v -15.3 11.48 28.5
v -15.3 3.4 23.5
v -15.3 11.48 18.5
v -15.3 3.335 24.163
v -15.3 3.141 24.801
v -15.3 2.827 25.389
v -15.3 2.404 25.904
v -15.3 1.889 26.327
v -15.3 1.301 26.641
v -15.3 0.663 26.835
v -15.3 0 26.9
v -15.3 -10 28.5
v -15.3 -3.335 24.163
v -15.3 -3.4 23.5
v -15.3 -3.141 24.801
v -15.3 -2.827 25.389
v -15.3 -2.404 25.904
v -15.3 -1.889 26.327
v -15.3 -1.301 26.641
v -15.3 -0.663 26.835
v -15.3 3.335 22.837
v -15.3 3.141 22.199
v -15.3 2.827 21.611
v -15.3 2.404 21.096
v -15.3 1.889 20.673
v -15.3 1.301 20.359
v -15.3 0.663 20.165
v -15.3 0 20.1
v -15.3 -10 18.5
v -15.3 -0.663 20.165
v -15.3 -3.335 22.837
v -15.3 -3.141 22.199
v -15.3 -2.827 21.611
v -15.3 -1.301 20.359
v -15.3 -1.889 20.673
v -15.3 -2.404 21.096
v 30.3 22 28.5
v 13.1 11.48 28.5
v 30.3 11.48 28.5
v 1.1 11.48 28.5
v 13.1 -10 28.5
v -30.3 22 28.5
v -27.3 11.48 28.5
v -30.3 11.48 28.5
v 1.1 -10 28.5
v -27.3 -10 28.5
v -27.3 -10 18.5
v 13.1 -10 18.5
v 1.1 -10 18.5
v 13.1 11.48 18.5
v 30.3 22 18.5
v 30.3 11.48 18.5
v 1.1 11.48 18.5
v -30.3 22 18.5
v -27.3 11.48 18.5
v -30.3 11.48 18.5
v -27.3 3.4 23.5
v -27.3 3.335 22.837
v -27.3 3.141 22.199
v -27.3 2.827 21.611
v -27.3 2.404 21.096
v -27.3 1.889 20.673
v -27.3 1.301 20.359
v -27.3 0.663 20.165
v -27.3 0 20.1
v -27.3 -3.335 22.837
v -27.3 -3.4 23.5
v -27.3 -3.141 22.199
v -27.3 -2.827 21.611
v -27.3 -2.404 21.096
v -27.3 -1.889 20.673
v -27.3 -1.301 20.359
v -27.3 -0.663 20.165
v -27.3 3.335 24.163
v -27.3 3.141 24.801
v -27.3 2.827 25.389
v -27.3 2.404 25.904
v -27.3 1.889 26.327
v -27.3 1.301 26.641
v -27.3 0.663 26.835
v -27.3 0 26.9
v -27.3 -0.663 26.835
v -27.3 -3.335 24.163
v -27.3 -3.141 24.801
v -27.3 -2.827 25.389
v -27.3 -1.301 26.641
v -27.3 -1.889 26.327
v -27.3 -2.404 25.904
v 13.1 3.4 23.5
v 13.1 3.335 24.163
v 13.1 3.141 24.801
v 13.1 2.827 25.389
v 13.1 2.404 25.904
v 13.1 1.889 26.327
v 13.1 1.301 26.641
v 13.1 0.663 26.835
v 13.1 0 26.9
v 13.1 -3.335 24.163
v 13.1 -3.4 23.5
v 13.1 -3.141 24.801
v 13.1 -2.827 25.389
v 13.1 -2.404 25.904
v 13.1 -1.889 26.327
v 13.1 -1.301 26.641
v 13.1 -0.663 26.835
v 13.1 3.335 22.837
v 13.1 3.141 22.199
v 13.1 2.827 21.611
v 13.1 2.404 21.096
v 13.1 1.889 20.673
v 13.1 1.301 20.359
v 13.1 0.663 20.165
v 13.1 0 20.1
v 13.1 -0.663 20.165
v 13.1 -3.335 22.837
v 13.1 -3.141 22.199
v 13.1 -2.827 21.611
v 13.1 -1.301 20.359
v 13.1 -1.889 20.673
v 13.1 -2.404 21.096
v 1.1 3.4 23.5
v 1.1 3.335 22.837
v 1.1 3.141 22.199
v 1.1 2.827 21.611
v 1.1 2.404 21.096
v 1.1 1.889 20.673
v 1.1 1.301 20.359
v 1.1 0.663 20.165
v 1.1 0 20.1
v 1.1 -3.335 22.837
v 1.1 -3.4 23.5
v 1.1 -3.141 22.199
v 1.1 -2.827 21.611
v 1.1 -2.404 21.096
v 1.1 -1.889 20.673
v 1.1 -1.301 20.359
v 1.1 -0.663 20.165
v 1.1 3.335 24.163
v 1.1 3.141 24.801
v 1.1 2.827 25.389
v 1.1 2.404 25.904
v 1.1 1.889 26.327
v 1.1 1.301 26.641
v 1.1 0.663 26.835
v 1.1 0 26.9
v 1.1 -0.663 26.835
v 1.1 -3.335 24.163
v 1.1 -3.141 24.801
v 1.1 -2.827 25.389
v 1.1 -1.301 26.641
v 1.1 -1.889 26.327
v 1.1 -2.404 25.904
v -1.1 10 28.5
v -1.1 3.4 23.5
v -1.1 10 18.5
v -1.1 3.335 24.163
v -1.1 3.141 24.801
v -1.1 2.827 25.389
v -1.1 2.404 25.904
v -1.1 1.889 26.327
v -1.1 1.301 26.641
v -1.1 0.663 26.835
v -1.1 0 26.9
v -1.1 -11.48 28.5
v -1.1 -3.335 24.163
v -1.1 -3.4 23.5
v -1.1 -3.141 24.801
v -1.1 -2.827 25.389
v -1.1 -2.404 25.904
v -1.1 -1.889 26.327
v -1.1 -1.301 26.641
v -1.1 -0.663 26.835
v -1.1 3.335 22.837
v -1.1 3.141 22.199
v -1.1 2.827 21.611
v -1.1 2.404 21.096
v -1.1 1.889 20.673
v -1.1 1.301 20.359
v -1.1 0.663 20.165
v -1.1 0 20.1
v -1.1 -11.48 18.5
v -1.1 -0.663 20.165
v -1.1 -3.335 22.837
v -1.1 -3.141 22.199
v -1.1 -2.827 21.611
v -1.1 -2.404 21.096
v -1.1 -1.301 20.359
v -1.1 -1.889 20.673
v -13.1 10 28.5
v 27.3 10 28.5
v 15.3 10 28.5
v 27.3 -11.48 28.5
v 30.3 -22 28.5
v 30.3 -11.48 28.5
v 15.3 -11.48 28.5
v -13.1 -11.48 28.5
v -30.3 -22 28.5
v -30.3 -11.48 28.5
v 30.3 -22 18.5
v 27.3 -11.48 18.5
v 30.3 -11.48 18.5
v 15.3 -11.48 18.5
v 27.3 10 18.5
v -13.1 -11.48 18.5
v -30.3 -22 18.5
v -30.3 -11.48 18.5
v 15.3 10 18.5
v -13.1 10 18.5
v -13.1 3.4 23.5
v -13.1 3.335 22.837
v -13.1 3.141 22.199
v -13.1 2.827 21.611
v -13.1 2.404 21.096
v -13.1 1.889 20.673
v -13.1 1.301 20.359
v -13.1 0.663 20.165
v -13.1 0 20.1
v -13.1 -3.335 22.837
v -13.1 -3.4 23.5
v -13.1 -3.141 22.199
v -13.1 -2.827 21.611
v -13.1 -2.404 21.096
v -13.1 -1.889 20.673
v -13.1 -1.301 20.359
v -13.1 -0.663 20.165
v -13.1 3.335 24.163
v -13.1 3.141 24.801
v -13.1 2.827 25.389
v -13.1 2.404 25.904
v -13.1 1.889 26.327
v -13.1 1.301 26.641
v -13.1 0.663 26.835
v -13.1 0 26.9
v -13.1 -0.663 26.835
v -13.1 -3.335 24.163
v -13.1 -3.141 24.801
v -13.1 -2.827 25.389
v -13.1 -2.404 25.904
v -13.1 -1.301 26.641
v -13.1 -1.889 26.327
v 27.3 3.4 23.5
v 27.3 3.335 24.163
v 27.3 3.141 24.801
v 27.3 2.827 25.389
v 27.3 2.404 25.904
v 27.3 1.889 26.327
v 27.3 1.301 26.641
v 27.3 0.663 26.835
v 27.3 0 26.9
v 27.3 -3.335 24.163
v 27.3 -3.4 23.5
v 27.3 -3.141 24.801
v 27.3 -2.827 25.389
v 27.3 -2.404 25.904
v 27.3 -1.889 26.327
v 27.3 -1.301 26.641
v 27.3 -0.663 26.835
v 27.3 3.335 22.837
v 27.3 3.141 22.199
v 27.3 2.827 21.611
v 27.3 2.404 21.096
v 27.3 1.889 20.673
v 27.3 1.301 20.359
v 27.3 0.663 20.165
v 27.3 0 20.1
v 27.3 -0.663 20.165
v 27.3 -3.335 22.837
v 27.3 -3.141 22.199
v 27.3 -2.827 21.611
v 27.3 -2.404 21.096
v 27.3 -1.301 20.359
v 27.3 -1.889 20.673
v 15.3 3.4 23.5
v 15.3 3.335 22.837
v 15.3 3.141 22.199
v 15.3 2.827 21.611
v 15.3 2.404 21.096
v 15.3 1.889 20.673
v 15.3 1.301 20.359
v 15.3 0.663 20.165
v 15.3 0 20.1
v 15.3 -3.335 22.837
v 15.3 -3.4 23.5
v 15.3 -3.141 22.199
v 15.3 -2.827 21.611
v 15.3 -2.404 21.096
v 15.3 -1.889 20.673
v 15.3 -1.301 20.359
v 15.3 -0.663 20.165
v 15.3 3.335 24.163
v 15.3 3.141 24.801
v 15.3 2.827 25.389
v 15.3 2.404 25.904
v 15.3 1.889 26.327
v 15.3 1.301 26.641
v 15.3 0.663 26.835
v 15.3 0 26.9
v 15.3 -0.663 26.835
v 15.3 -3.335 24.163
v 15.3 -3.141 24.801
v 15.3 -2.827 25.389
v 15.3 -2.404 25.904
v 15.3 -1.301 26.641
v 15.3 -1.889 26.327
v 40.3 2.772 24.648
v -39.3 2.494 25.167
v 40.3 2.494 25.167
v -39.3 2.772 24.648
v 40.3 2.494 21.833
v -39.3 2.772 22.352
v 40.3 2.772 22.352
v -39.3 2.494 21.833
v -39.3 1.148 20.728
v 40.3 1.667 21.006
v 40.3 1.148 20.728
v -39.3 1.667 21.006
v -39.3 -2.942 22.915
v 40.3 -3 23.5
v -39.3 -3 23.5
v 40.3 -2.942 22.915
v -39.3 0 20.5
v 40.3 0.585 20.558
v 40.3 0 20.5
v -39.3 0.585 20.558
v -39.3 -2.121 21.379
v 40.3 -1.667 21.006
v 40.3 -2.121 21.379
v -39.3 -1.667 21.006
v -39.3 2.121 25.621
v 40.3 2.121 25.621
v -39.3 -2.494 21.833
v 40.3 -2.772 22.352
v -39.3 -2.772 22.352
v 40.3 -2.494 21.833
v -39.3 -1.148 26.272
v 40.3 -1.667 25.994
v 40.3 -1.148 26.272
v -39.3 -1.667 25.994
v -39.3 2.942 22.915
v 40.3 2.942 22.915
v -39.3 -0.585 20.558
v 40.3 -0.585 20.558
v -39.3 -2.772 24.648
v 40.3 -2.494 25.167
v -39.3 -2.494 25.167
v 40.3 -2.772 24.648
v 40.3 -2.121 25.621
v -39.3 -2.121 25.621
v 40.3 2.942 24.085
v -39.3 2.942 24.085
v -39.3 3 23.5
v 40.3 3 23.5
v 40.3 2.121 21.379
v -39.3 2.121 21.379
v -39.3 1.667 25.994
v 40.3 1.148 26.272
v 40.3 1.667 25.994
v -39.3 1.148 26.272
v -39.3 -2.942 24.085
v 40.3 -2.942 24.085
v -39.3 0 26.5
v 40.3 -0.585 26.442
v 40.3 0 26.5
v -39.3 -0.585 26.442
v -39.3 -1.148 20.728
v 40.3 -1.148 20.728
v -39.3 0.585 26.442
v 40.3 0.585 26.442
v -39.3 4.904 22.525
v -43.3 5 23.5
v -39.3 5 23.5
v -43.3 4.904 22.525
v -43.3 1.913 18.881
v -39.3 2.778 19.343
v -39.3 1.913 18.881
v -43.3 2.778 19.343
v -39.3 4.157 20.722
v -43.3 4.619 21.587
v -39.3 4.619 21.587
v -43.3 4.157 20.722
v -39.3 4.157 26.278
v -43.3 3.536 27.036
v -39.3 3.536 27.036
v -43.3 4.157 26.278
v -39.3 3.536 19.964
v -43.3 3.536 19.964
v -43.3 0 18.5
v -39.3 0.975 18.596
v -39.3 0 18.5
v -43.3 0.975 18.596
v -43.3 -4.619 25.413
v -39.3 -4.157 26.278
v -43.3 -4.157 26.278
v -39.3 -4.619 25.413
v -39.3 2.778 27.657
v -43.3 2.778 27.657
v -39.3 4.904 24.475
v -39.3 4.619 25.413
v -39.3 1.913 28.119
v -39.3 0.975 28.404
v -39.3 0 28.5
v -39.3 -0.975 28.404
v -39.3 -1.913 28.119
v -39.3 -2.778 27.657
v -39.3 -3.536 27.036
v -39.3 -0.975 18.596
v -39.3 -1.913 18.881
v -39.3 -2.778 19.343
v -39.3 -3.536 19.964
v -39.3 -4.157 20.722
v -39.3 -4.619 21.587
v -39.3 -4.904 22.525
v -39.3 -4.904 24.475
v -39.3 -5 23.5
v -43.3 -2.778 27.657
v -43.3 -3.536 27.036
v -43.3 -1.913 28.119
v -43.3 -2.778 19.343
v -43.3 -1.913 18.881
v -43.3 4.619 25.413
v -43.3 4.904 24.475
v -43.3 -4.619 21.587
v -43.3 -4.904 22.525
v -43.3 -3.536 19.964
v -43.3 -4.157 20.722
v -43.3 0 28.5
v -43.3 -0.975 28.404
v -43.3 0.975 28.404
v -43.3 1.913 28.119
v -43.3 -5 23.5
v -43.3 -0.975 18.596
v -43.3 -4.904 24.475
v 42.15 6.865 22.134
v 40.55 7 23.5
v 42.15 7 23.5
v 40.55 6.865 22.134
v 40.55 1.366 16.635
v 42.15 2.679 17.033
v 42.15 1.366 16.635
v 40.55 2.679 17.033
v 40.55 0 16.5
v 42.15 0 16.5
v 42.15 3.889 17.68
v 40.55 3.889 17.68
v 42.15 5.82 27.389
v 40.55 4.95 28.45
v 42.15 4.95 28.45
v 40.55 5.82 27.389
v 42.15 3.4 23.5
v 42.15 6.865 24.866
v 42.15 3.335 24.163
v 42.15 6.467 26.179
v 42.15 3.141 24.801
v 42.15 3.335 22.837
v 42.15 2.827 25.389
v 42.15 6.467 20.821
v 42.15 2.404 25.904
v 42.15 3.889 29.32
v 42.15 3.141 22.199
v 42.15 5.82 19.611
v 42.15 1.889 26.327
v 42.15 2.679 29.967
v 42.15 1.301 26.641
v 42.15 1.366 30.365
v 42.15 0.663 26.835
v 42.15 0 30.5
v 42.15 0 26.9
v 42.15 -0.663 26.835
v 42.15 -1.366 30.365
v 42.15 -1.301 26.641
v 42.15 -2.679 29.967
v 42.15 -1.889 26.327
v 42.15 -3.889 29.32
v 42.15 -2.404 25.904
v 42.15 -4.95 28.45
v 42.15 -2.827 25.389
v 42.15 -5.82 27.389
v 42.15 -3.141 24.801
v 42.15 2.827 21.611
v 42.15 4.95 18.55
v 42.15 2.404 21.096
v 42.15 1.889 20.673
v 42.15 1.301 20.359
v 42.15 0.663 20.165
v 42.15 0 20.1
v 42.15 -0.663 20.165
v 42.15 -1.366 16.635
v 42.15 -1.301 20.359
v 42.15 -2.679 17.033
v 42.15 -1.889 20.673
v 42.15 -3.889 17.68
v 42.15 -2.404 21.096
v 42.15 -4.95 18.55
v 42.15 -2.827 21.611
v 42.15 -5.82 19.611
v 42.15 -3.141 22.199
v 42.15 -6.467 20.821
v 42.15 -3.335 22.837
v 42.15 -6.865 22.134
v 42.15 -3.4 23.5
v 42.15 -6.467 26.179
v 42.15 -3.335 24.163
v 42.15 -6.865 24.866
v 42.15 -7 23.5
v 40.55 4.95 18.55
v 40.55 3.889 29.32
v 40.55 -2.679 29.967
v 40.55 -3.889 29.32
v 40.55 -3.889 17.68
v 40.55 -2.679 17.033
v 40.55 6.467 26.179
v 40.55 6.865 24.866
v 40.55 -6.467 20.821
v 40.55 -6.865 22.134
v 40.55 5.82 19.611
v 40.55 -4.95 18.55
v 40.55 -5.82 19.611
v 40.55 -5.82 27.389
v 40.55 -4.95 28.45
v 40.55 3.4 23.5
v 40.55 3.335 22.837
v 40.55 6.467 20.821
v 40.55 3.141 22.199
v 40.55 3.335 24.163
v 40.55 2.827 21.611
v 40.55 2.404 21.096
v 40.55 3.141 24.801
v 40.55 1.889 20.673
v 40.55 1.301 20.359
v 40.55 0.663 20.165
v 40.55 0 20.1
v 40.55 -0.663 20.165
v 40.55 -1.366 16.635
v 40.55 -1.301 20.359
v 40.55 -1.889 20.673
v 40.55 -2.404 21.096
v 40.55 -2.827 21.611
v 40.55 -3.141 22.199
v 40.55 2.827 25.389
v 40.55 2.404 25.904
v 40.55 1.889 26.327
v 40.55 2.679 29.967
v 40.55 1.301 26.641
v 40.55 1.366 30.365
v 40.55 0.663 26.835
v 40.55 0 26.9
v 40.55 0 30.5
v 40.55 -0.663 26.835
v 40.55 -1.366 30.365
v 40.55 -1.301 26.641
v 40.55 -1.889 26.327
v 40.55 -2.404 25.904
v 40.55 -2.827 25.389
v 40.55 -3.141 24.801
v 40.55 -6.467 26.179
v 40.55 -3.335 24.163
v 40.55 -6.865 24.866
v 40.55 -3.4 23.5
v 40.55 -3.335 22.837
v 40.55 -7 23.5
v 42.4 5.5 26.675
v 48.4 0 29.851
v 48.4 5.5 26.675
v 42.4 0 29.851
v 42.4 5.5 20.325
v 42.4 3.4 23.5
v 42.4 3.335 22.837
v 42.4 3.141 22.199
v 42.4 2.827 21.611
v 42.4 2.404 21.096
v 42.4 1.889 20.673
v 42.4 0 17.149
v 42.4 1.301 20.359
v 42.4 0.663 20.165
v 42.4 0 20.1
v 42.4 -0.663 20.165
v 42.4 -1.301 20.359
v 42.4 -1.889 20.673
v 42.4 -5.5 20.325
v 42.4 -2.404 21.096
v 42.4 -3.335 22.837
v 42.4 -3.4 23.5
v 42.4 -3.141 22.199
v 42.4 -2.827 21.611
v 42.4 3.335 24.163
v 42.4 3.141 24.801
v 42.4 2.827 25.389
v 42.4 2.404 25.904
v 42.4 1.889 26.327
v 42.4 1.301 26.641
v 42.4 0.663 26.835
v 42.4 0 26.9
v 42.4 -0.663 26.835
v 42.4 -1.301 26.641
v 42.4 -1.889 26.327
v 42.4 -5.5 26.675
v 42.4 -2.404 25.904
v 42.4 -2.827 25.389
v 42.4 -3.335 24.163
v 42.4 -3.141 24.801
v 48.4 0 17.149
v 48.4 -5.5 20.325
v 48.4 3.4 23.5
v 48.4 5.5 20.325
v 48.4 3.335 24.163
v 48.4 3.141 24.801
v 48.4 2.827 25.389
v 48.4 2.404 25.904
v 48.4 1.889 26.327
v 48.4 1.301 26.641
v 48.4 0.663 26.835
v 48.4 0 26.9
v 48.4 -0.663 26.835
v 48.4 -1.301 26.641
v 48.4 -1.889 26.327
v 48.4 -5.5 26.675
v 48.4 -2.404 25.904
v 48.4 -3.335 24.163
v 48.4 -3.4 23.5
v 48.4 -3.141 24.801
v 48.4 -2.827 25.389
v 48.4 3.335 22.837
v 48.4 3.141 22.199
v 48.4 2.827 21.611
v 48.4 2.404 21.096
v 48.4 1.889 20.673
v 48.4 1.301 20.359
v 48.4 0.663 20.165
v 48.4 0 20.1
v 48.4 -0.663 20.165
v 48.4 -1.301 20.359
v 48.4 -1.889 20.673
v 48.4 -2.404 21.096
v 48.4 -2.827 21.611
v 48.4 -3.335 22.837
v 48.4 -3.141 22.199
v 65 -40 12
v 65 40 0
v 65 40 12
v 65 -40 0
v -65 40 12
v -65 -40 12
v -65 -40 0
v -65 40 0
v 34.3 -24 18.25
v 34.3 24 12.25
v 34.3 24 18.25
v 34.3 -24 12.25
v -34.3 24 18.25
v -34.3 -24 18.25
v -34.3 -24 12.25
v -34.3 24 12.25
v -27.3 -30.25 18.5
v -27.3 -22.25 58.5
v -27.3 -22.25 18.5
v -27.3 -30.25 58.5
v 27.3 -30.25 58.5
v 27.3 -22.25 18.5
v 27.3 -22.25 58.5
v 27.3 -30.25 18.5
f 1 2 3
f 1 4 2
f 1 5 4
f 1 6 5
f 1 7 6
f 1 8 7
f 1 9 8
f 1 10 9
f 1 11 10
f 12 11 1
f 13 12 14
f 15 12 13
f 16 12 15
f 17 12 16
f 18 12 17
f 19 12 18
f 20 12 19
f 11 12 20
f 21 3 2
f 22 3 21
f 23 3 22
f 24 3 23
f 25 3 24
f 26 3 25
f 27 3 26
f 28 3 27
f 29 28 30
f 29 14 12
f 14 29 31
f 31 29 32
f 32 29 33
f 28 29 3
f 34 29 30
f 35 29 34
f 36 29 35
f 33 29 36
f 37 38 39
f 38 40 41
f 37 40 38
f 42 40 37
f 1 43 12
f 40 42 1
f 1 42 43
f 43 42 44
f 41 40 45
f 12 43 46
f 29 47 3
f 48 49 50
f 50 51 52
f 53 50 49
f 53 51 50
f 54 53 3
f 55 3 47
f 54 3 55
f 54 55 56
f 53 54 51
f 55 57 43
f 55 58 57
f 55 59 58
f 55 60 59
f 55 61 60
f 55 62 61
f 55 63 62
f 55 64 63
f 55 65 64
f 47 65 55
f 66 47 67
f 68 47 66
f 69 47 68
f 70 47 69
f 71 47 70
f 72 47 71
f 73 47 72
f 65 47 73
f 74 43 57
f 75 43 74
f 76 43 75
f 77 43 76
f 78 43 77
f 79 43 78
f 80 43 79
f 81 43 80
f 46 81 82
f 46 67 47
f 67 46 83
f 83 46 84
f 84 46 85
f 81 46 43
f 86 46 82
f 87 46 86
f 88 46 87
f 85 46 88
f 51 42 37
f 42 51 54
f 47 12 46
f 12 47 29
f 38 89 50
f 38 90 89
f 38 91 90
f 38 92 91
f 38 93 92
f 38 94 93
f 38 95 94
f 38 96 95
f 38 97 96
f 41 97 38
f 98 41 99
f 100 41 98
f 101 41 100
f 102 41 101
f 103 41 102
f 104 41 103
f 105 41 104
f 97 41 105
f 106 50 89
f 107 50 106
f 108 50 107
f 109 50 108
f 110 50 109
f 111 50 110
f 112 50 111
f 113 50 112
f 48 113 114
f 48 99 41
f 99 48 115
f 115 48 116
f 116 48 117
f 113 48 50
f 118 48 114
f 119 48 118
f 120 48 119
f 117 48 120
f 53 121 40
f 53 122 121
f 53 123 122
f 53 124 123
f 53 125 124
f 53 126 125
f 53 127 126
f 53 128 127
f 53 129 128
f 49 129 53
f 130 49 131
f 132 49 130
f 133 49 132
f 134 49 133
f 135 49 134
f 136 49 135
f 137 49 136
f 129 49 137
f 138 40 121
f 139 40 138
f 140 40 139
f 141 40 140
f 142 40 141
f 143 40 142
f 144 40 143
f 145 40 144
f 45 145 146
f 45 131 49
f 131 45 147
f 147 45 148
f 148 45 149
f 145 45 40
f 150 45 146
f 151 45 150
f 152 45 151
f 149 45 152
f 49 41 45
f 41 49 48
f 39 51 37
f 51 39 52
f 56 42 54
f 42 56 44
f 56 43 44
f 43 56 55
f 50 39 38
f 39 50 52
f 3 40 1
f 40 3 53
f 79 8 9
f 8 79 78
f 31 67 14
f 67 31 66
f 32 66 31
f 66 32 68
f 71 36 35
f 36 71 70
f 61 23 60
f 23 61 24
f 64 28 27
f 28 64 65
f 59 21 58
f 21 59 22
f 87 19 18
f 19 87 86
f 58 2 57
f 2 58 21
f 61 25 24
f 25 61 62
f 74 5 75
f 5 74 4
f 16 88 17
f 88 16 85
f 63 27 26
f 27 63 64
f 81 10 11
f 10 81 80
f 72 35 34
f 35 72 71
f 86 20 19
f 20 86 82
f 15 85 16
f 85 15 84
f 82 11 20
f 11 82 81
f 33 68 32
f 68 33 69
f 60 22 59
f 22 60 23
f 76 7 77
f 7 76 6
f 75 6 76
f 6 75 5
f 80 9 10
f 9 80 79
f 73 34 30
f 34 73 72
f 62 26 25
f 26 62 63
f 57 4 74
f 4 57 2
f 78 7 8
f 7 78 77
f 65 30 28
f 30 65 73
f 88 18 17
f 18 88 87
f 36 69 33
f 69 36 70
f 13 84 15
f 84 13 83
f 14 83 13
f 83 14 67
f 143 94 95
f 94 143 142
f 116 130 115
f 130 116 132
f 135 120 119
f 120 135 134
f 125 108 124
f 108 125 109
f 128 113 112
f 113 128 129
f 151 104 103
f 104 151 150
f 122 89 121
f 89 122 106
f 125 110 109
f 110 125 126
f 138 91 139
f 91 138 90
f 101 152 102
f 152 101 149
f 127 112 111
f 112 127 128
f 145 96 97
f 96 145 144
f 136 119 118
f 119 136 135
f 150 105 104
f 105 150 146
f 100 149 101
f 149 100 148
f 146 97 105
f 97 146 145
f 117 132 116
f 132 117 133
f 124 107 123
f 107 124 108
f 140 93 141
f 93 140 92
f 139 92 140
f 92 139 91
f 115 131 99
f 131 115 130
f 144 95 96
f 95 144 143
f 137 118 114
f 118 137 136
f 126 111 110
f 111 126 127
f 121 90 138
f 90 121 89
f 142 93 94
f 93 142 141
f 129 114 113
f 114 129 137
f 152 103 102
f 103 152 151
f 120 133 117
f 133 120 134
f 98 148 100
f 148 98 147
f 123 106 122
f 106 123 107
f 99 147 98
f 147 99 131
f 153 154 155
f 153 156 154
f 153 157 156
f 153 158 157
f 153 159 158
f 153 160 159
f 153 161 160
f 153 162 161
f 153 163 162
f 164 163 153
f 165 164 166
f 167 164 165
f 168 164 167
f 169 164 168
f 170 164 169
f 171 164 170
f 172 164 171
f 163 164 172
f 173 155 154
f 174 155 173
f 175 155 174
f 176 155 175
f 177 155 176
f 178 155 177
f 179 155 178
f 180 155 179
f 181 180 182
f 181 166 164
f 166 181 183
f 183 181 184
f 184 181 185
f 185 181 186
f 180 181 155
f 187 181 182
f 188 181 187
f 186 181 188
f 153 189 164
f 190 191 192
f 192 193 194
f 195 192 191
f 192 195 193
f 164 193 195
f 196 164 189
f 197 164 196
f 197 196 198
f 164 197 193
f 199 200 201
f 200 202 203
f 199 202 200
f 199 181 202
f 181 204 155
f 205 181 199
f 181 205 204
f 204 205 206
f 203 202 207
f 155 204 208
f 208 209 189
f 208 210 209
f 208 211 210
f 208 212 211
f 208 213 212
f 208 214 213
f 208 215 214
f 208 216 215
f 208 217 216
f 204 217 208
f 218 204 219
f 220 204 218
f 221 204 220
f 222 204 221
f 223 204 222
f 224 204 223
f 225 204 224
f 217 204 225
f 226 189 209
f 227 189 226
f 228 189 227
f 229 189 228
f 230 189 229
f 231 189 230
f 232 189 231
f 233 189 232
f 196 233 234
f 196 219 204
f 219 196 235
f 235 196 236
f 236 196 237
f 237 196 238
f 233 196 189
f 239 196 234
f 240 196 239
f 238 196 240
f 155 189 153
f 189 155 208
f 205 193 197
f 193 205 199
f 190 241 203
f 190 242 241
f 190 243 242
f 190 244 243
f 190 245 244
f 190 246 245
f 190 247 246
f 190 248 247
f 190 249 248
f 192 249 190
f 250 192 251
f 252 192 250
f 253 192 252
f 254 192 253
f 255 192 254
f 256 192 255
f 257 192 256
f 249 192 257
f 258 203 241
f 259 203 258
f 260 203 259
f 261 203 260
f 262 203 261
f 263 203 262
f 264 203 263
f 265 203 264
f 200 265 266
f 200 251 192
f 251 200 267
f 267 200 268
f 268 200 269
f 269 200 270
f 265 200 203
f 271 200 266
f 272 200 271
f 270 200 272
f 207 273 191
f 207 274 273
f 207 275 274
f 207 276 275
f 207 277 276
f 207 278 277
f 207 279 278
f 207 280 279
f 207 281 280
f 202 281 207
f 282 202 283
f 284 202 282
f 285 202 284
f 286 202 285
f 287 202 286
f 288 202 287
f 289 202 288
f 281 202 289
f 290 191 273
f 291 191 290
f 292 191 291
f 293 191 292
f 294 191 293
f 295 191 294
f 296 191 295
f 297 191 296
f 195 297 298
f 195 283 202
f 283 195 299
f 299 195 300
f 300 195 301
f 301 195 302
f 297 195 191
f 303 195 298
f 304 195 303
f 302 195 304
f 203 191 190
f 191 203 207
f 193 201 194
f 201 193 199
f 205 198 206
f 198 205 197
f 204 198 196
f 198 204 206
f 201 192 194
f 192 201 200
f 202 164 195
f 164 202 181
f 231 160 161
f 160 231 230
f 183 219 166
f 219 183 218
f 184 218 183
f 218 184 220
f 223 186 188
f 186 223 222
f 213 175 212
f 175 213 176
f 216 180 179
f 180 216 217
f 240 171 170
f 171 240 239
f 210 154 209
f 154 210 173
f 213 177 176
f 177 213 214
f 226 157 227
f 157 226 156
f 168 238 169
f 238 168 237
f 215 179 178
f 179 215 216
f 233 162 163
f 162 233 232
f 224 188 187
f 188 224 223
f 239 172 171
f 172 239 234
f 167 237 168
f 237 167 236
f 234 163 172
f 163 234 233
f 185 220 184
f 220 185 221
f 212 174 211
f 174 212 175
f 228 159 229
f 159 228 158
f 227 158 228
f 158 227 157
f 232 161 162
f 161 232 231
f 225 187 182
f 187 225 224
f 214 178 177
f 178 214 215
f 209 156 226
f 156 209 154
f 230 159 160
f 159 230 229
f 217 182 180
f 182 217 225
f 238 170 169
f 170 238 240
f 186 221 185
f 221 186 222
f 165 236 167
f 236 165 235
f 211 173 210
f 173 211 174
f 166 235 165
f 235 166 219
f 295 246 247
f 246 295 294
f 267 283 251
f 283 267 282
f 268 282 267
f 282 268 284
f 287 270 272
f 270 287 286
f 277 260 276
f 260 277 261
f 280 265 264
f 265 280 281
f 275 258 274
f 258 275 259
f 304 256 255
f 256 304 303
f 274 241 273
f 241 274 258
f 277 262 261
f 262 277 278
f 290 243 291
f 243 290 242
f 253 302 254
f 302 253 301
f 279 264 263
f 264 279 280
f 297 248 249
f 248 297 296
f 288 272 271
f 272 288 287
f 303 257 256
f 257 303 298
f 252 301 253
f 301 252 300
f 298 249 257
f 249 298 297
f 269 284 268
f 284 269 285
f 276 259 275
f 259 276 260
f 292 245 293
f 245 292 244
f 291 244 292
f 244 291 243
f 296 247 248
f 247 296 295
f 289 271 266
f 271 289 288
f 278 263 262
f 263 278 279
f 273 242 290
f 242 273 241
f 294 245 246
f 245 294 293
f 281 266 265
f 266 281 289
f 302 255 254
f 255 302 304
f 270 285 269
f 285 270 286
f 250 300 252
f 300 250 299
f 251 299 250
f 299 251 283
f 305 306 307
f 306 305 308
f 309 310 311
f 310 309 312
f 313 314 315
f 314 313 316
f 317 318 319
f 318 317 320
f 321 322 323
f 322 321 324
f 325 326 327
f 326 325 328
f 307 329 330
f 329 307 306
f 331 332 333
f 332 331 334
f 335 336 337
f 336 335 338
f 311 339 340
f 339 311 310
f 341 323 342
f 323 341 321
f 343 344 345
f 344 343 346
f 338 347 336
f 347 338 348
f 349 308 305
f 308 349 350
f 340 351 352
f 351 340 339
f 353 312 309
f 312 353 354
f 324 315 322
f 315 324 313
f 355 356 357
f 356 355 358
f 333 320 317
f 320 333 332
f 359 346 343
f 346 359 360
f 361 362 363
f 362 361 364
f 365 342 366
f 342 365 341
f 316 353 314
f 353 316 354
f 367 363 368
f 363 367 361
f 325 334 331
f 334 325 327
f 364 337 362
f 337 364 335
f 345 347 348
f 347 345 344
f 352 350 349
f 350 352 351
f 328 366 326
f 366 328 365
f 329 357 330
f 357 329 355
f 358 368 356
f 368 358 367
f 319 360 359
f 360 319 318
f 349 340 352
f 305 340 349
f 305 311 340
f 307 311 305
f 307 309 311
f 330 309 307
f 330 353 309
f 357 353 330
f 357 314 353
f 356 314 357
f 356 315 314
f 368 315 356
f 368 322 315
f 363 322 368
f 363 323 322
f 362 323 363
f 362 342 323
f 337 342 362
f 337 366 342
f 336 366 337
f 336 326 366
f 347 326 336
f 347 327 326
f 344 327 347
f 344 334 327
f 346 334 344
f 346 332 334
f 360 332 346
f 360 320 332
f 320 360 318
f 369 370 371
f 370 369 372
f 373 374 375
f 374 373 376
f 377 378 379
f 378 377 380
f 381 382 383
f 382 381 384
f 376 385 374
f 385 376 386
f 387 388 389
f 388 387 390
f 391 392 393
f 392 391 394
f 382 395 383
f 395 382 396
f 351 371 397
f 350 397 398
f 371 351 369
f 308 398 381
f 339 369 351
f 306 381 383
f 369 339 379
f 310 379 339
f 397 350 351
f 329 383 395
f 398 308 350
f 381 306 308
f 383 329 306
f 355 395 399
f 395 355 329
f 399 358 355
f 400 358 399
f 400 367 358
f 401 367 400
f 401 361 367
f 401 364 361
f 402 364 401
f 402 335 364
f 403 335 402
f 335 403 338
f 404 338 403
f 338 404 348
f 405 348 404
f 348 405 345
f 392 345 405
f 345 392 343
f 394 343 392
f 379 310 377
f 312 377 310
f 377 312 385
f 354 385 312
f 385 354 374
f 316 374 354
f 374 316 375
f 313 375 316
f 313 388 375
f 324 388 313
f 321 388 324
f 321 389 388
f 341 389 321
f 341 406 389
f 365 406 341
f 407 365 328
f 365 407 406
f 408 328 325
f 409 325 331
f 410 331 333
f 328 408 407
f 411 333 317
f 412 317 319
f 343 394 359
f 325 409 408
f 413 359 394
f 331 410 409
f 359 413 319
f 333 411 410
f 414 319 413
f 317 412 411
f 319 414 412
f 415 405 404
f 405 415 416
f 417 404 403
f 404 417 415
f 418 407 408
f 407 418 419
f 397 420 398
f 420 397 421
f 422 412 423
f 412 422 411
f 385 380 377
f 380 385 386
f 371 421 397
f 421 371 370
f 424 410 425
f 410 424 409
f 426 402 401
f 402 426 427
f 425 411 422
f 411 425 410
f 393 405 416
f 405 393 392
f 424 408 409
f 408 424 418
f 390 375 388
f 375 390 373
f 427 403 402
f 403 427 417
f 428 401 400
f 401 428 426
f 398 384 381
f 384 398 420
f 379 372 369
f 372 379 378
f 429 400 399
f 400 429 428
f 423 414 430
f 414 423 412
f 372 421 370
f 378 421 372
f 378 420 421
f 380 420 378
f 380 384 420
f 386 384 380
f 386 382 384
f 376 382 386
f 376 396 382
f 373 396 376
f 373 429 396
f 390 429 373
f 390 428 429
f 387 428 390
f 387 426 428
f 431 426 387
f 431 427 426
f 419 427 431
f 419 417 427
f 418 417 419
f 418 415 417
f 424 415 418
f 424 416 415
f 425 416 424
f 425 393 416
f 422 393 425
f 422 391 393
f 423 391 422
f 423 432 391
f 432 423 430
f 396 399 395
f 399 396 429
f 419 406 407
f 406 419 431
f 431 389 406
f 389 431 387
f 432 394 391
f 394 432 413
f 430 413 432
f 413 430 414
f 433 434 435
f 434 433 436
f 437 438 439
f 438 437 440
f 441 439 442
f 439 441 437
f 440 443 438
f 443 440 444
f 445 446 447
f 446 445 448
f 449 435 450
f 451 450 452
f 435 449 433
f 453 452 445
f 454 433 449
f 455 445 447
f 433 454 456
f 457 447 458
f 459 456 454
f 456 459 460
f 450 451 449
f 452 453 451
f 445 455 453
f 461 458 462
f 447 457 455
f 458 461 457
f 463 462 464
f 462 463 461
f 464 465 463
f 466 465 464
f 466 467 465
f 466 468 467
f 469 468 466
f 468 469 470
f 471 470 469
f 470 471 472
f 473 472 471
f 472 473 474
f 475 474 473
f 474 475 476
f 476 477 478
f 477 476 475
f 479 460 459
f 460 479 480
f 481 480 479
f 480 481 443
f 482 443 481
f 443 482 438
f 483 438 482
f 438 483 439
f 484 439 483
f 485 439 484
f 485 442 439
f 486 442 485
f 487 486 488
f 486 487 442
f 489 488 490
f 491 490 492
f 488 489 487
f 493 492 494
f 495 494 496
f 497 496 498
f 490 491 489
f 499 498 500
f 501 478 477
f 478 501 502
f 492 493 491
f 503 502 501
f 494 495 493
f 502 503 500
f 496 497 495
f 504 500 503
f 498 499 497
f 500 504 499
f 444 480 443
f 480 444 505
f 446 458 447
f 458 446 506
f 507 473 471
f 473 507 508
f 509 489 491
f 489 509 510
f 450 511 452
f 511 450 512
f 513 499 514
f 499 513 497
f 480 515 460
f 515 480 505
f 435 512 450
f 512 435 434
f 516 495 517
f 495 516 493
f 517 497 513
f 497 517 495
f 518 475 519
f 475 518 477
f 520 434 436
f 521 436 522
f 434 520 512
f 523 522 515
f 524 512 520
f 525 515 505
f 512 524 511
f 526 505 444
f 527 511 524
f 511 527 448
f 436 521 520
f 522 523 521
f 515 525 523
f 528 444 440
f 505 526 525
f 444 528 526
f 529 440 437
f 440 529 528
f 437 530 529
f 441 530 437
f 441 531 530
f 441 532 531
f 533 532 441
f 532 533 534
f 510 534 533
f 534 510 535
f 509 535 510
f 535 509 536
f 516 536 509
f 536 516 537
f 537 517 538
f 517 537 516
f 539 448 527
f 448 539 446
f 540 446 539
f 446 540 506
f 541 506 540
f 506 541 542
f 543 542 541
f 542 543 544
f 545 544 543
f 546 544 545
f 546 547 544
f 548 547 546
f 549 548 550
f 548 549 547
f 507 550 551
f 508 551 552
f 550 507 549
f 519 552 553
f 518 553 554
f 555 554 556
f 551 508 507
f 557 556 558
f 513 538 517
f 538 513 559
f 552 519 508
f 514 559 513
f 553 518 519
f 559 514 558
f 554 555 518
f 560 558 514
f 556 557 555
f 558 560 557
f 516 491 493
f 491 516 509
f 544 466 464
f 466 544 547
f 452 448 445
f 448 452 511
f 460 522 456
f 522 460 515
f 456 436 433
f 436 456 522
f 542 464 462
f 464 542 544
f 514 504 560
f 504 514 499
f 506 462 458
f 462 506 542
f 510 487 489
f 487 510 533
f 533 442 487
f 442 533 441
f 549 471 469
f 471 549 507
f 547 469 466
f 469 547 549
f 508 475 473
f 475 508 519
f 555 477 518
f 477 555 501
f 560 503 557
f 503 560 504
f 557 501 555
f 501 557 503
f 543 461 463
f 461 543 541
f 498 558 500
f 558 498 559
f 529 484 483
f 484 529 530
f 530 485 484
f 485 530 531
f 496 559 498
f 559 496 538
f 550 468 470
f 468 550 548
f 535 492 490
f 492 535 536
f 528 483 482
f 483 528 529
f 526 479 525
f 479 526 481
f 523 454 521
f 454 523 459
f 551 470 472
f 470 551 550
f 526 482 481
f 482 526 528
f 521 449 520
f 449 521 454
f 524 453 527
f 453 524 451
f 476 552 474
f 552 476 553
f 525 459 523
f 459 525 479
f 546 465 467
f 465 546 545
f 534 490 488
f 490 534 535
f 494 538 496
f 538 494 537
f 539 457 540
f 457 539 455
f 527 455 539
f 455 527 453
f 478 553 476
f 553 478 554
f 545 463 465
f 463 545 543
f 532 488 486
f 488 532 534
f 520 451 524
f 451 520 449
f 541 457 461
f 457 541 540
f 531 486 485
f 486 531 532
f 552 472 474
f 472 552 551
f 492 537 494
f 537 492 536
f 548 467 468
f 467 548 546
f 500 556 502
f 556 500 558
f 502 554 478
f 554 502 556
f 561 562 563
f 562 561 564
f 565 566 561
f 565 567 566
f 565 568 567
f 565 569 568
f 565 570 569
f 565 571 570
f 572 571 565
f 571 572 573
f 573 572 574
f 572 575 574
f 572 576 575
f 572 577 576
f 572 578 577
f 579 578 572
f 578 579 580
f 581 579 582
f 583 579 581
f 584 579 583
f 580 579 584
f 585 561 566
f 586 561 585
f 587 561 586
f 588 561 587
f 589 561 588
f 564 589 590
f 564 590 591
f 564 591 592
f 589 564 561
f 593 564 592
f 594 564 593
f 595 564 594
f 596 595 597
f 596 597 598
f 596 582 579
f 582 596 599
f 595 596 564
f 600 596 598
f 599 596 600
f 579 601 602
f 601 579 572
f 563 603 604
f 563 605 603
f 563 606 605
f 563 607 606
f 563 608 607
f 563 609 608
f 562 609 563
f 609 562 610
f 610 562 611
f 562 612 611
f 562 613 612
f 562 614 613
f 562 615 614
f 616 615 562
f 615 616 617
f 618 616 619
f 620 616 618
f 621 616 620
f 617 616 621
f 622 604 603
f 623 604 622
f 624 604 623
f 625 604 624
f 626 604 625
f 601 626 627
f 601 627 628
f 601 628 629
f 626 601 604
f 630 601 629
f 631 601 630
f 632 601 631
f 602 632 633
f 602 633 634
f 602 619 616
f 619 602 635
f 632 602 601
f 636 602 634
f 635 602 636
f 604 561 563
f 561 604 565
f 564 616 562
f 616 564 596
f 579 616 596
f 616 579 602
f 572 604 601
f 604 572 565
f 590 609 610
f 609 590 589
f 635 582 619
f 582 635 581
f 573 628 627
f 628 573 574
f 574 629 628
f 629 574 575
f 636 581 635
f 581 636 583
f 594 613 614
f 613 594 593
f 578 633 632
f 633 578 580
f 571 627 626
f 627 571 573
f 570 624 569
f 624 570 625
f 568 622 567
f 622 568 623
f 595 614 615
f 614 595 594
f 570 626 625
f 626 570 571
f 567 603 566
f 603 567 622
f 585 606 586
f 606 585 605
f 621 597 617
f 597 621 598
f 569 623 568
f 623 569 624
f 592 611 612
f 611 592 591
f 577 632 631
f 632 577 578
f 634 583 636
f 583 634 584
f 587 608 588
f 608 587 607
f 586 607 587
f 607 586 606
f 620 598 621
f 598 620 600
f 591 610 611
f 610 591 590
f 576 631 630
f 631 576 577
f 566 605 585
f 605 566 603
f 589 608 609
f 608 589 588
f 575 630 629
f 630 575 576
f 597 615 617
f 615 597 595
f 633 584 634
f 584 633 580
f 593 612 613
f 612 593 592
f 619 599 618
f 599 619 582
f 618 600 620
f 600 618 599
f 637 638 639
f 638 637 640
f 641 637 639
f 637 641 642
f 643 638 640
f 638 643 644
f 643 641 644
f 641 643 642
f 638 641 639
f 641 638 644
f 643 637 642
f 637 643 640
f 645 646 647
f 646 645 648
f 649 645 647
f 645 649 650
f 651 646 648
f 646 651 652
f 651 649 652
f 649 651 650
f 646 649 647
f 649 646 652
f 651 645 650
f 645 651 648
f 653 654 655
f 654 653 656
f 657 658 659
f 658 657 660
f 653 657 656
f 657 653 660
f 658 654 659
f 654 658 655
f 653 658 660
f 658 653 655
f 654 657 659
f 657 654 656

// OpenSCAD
$fn = 32;

// ------------------------------------------------------------------------
// Comb hinge with flap: leaf 60.6 x 22 mm, pin d6, flap 40 mm
// Every part is its own module, assembly() places every instance.
// ------------------------------------------------------------------------

// --- part 1 ---
module hinge_bed() {
  difference() {
    translate([-65, -40, 0]) cube([130, 80, 12]);
  }
}

// --- part 2 ---
module hinge_riser() {
  difference() {
    translate([-34.3, -24, 0]) cube([68.6, 48, 6]);
  }
}

// --- part 3 ---
module hinge_leaf_a() {
  difference() {
    union() {
      translate([-27.3, -10, -5]) cube([12, 32, 10]);
      translate([1.1, -10, -5]) cube([12, 32, 10]);
      translate([-30.3, 11.48, -5]) cube([60.6, 10.52, 10]);
    }
    translate([-21.3, 0, 0]) rotate([0, 90, 0]) cylinder(h = 14, d = 6.8, center = true);
    translate([7.1, 0, 0]) rotate([0, 90, 0]) cylinder(h = 14, d = 6.8, center = true);
  }
}

// --- part 4 ---
module hinge_leaf_b() {
  difference() {
    union() {
      translate([-13.1, -22, -5]) cube([12, 32, 10]);
      translate([15.3, -22, -5]) cube([12, 32, 10]);
      translate([-30.3, -22, -5]) cube([60.6, 10.52, 10]);
    }
    translate([-7.1, 0, 0]) rotate([0, 90, 0]) cylinder(h = 14, d = 6.8, center = true);
    translate([21.3, 0, 0]) rotate([0, 90, 0]) cylinder(h = 14, d = 6.8, center = true);
  }
}

// --- part 5 ---
module hinge_flap() {
  difference() {
    translate([-27.3, -20, 0]) cube([54.6, 40, 8]);
  }
}

// --- part 6 ---
module hinge_pin() {
  rotate([0, 90, 0]) cylinder(h = 80.6, d = 6, center = true);
  translate([-43.3, 0, 0]) rotate([0, 90, 0]) cylinder(h = 4, d = 10);
}

// --- part 7 ---
module pin_washer() {
  difference() {
      translate([0, 0, 0]) cylinder(h = 1.6, d = 14);
      translate([0, 0, -1]) cylinder(h = 3.6, d = 6.8);
    }
}

// --- part 8 ---
module pin_nut() {
  difference() {
    linear_extrude(height = 6) polygon(points = [[6.351, 0], [3.175, 5.5], [-3.175, 5.5], [-6.351, 0], [-3.175, -5.5], [3.175, -5.5]]);
    translate([0, 0, -1]) cylinder(h = 8, d = 6.8);
  }
}

// --- assembly ---
module assembly() {
  color([0.80, 0.24, 0.20]) translate([0, 0, 0]) rotate([0, 0, 0]) hinge_bed();
  color([0.20, 0.45, 0.75]) translate([0, 0, 12.25]) rotate([0, 0, 0]) hinge_riser();
  color([0.25, 0.62, 0.32]) translate([0, 0, 23.5]) rotate([0, 0, 0]) hinge_leaf_a();
  color([0.92, 0.70, 0.18]) translate([0, 0, 23.5]) rotate([0, 0, 0]) hinge_leaf_b();
  color([0.58, 0.35, 0.70]) translate([0, -22.25, 38.5]) rotate([90, 0, 0]) hinge_flap();
  color([0.16, 0.66, 0.66]) translate([0, 0, 23.5]) rotate([0, 0, 0]) hinge_pin();
  color([0.85, 0.48, 0.18]) translate([40.55, 0, 23.5]) rotate([0, 90, 0]) pin_washer();
  color([0.55, 0.60, 0.65]) translate([42.4, 0, 23.5]) rotate([0, 90, 0]) pin_nut();
}

assembly();
